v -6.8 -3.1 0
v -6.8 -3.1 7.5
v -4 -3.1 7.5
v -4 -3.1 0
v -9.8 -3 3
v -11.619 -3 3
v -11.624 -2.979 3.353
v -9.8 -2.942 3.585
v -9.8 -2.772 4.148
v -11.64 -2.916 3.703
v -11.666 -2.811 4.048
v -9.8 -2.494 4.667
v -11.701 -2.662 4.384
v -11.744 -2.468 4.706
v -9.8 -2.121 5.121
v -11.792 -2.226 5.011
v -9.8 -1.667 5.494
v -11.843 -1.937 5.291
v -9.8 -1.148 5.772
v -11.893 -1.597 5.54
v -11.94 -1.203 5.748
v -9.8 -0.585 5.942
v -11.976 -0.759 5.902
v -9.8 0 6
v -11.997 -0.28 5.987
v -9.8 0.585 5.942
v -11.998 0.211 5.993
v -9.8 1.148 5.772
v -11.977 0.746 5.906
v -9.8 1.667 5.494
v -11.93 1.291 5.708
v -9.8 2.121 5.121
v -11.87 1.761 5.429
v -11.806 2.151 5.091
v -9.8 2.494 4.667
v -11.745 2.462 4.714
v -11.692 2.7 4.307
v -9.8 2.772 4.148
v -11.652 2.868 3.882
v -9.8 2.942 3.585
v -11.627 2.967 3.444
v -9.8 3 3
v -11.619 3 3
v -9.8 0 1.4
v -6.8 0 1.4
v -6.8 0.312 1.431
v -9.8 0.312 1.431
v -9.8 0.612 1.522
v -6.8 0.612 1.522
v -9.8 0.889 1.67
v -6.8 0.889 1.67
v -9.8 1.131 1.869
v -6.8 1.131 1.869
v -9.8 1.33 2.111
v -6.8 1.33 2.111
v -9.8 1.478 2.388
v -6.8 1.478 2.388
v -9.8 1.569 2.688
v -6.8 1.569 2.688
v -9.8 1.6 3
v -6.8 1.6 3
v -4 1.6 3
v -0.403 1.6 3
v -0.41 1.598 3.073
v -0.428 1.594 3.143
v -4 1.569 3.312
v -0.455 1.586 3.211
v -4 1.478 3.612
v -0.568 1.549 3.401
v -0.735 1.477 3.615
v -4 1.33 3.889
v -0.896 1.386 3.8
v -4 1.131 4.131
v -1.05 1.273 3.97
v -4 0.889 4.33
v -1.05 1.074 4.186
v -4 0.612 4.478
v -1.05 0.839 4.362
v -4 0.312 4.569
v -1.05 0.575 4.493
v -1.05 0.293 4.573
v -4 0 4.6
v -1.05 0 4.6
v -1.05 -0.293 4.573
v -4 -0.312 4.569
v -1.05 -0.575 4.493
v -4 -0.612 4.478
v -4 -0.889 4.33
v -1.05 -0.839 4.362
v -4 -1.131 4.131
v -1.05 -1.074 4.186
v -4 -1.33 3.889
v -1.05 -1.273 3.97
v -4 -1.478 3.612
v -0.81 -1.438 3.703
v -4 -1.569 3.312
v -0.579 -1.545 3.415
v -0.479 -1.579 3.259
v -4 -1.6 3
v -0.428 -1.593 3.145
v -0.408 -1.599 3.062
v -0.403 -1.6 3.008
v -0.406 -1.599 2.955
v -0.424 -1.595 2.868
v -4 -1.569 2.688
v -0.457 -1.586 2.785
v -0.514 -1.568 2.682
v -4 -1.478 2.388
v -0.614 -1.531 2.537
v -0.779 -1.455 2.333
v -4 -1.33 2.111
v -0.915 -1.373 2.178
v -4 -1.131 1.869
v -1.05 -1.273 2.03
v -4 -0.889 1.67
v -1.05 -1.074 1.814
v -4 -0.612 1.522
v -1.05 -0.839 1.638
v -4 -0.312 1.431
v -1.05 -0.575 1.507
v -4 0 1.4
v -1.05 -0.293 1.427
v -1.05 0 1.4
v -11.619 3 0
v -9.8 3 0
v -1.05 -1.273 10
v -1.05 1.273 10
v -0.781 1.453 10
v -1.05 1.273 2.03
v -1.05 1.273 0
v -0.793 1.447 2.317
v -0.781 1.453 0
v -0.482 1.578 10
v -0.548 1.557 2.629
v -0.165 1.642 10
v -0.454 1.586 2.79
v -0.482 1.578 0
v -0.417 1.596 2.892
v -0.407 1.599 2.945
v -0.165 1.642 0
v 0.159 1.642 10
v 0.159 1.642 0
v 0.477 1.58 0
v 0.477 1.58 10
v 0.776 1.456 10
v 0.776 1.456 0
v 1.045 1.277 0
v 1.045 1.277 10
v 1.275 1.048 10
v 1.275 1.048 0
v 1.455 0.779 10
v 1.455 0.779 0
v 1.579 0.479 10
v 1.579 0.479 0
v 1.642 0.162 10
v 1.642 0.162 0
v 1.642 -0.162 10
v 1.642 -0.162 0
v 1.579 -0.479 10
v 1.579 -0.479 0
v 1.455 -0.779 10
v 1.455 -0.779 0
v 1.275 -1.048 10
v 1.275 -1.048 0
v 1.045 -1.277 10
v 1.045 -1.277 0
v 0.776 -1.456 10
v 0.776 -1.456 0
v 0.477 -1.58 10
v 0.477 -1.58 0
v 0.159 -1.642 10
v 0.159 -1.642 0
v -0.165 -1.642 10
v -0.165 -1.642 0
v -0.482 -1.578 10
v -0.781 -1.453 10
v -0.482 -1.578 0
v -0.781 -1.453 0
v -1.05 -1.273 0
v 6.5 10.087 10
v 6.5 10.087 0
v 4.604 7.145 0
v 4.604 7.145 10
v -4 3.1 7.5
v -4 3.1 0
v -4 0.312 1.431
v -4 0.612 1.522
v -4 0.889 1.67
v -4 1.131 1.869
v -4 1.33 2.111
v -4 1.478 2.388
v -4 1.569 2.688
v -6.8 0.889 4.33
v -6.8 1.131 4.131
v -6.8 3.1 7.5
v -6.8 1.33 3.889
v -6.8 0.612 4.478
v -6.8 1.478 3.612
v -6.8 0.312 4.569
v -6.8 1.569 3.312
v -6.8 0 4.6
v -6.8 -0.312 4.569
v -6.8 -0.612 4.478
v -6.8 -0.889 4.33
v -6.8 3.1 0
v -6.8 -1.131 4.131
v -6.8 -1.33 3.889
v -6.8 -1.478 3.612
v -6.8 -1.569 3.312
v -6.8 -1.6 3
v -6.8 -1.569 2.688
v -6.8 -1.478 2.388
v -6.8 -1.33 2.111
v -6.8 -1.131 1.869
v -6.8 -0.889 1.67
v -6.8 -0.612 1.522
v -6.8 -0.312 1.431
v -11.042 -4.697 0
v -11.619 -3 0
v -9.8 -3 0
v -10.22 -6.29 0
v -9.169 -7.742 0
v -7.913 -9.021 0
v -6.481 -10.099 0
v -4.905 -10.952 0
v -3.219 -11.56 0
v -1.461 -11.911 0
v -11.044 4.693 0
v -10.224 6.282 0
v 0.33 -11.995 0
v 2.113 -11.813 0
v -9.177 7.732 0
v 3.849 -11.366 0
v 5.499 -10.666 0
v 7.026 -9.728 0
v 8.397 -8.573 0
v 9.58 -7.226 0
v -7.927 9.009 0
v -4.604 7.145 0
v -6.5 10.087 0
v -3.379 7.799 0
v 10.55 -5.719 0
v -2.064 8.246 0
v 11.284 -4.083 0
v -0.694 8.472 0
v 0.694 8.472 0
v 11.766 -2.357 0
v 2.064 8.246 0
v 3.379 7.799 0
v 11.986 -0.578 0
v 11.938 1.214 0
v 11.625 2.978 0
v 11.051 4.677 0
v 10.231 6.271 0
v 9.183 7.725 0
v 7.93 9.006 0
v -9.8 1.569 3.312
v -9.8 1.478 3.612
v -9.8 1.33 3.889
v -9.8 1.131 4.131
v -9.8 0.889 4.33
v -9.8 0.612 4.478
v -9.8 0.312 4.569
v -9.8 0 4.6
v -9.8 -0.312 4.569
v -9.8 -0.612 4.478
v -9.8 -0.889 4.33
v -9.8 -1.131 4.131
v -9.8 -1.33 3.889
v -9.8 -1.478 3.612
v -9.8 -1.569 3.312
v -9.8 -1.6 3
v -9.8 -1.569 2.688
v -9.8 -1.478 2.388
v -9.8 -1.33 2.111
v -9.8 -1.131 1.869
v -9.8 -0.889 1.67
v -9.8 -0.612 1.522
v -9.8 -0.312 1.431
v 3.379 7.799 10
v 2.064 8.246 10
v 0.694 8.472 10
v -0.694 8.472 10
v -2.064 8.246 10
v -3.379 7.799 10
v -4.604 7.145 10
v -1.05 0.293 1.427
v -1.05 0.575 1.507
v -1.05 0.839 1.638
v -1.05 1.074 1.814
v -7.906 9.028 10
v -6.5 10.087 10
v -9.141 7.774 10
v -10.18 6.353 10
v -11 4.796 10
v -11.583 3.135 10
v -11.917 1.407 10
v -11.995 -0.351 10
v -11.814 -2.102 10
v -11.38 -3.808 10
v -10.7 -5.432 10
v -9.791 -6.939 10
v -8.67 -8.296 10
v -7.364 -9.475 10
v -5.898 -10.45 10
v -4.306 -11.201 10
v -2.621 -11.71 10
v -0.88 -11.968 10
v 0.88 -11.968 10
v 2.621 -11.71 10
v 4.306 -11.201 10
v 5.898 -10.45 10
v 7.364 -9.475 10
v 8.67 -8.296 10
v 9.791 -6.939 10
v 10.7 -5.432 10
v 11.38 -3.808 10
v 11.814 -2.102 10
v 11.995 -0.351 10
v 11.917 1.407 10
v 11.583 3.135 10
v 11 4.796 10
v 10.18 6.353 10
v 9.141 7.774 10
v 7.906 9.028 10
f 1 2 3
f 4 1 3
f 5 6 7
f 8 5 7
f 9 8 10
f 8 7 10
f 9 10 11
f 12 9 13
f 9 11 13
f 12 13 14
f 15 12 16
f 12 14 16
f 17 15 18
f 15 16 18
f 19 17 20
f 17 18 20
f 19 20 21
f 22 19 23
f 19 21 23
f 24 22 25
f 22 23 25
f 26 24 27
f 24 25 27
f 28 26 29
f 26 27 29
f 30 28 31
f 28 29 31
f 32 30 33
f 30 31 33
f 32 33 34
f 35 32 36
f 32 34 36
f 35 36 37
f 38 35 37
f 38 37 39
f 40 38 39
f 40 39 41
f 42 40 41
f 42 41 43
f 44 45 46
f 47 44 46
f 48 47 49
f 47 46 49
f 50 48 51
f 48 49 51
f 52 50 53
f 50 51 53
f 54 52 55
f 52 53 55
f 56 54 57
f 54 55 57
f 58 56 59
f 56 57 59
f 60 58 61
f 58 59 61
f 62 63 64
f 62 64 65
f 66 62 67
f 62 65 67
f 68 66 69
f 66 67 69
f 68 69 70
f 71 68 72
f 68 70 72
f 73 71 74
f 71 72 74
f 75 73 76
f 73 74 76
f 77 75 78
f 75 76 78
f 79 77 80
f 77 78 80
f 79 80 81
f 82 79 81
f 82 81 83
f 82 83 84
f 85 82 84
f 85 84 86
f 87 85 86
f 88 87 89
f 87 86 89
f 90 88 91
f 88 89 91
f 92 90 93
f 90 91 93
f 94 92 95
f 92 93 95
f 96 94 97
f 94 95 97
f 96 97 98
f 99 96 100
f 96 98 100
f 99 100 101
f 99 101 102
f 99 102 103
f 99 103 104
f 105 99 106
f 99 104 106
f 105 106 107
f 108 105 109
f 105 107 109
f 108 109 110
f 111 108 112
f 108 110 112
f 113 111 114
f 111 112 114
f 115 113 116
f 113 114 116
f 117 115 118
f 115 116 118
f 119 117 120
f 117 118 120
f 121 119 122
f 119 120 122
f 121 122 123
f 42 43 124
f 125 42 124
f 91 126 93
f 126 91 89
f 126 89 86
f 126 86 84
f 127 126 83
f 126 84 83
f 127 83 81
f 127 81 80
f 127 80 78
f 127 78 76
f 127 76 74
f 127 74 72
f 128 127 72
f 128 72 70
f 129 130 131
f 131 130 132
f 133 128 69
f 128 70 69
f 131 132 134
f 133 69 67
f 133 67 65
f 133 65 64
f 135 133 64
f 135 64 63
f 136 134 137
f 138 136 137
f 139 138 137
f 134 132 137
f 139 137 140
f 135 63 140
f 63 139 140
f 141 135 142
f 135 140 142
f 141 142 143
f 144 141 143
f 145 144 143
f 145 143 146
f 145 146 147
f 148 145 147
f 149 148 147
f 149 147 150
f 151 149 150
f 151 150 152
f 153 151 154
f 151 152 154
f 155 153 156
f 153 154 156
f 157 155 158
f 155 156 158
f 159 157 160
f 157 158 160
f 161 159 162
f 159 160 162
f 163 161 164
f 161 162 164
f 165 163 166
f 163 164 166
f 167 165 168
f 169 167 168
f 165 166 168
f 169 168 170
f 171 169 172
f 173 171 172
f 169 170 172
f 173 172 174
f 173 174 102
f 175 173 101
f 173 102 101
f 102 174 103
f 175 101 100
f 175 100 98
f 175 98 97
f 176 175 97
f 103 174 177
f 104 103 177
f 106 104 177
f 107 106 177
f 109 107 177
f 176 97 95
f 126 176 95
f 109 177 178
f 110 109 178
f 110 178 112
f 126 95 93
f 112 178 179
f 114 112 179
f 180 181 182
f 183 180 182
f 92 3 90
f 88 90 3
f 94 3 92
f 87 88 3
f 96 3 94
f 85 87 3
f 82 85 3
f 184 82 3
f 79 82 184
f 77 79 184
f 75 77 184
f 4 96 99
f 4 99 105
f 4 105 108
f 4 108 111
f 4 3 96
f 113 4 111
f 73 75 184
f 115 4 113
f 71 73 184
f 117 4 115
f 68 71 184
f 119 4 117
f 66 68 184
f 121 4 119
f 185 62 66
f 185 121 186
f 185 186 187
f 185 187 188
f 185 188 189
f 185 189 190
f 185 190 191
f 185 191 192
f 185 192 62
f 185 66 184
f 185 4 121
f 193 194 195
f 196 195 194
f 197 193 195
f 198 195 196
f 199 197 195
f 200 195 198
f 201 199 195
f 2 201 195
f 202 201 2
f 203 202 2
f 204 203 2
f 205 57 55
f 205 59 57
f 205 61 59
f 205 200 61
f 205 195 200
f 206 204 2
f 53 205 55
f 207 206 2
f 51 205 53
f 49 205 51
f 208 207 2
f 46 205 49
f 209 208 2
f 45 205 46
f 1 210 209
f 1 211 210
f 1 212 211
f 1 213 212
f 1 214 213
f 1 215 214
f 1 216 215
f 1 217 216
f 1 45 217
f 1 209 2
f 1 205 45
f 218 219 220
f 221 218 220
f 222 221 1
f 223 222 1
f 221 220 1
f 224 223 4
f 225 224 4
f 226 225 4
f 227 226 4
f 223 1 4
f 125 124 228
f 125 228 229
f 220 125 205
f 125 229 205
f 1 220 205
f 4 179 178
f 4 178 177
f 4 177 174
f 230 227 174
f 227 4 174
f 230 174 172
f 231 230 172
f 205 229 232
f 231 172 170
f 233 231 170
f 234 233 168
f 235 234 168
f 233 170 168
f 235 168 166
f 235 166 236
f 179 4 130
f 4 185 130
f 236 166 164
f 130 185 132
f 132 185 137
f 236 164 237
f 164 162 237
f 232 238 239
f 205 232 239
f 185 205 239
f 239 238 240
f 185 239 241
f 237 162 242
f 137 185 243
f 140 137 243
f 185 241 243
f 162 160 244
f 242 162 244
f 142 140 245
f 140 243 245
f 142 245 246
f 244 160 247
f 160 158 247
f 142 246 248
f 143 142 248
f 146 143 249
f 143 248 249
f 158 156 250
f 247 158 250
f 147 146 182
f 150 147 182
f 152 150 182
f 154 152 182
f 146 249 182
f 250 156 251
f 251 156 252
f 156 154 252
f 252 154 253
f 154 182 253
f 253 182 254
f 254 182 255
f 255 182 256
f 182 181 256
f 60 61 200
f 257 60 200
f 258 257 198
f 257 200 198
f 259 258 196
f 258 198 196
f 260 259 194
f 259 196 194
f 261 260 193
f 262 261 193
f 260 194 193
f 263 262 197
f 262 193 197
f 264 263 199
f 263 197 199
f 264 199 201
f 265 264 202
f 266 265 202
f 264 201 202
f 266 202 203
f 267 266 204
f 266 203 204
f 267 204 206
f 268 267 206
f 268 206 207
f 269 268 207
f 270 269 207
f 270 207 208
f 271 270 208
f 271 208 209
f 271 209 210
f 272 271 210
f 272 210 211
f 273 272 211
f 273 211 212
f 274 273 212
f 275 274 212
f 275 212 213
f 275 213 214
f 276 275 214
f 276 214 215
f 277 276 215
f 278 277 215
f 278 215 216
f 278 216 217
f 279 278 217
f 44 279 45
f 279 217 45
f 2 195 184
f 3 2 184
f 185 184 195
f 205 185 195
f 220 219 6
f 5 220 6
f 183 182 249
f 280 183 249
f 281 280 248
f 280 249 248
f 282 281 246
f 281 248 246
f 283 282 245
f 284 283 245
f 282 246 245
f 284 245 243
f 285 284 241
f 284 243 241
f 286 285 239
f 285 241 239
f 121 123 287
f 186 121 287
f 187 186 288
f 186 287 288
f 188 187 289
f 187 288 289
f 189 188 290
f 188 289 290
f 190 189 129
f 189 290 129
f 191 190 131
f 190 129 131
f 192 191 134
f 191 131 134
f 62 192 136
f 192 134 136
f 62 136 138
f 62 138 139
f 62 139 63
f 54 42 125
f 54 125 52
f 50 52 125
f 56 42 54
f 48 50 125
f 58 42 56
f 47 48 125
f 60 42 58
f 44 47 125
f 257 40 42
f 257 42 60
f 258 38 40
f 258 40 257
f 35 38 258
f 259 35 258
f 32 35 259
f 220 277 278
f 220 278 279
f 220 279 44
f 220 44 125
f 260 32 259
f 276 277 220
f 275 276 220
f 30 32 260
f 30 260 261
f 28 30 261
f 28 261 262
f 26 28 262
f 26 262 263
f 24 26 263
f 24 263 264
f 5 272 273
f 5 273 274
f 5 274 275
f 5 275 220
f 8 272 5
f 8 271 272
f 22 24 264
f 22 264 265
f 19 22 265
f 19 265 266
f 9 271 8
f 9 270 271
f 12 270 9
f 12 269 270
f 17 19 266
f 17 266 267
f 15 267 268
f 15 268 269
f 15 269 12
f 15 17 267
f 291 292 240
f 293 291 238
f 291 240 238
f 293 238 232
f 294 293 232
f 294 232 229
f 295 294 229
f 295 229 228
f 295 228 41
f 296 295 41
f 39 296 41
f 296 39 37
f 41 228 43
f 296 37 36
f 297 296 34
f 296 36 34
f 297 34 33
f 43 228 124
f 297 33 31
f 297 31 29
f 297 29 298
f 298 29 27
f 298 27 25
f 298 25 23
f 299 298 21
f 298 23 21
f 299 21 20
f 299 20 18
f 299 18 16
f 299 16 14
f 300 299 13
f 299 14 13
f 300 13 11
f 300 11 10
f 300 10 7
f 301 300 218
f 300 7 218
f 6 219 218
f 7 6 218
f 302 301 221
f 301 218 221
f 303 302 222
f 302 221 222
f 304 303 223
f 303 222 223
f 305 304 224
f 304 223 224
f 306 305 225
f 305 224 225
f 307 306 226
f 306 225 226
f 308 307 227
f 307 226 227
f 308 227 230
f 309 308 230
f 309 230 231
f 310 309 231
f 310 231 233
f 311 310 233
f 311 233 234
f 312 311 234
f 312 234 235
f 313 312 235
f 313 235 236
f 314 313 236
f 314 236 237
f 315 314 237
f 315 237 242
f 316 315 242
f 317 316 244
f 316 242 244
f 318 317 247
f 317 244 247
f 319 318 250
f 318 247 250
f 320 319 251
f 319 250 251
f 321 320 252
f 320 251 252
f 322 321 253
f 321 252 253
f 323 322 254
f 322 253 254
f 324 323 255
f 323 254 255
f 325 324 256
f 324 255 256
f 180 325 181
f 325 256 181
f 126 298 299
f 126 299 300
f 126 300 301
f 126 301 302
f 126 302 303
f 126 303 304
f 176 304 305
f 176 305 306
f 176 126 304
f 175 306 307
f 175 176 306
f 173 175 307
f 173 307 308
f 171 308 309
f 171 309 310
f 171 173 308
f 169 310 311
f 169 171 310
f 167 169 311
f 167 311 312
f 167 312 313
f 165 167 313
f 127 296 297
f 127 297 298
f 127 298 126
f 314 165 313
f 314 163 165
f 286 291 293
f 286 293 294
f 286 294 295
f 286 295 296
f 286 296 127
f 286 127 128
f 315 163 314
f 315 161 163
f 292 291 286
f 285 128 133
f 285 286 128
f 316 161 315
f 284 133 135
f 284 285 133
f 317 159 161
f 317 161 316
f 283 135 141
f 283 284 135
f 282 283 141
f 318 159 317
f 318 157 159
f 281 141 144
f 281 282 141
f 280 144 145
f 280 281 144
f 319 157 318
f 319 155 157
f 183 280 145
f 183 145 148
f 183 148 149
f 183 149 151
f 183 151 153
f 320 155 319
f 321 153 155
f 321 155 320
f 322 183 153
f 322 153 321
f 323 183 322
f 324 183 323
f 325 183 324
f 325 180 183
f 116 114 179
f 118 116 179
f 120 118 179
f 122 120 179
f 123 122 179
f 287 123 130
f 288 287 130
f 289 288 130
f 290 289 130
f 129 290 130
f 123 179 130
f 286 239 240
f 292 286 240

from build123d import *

# Parameters (mm, degrees)
F1_DEPTH = 10
F3_DEPTH = 7.5
F5_DEPTH = 25
F8_DEPTH = 2.2


with BuildPart() as f1:
    # F0 (on Top) → F1 (new body)
    with BuildSketch(Plane.XY):
        with BuildLine():
            Line((-4.6041666667, 7.1450436881), (-6.5, 10.0871205009))
            ThreePointArc((-6.5, 10.0871205009), (0, -12), (6.5, 10.0871205009))
            Line((6.5, 10.0871205009), (4.6041666667, 7.1450436881))
            ThreePointArc((4.6041666667, 7.1450436881), (0, 8.5), (-4.6041666667, 7.1450436881))
        make_face()
        with BuildLine():
            ThreePointArc((-1.05, 1.2727922061), (1.65, 0), (-1.05, -1.2727922061))
            Line((-1.05, -1.2727922061), (-1.05, 1.2727922061))
        make_face(mode=Mode.SUBTRACT)
    extrude(amount=F1_DEPTH)

    # F2 (on Top) → F3 (cut)
    with BuildSketch(Plane.XY):
        Polygon((-4, 0), (-4, 3.1), (-6.8, 3.1), (-6.8, -3.1), (-4, -3.1), align=None)
    extrude(amount=F3_DEPTH, mode=Mode.SUBTRACT)

    # F4 (on Right) → F5 (cut)
    with BuildSketch(Plane.YZ):
        with BuildLine():
            ThreePointArc((0, 1.4), (1.1313708499, 1.8686291501), (1.6, 3))
            ThreePointArc((1.6, 3), (-1.1313708499, 4.1313708499), (0, 1.4))
        make_face()
    extrude(amount=-F5_DEPTH, mode=Mode.SUBTRACT)

    # F7 (on offset) → F8 (cut)
    with BuildSketch(Plane(origin=(-12, 0, 0), x_dir=(0, -1, 0), z_dir=(-1, 0, 0))):
        with BuildLine():
            Line((3, -2.9697169084), (3, 3))
            ThreePointArc((3, 3), (0, 6), (-3, 3))
            Line((-3, 3), (-3, -2.9697169084))
            Line((-3, -2.9697169084), (3, -2.9697169084))
        make_face()
    extrude(amount=-F8_DEPTH, mode=Mode.SUBTRACT)


solid = f1.part
